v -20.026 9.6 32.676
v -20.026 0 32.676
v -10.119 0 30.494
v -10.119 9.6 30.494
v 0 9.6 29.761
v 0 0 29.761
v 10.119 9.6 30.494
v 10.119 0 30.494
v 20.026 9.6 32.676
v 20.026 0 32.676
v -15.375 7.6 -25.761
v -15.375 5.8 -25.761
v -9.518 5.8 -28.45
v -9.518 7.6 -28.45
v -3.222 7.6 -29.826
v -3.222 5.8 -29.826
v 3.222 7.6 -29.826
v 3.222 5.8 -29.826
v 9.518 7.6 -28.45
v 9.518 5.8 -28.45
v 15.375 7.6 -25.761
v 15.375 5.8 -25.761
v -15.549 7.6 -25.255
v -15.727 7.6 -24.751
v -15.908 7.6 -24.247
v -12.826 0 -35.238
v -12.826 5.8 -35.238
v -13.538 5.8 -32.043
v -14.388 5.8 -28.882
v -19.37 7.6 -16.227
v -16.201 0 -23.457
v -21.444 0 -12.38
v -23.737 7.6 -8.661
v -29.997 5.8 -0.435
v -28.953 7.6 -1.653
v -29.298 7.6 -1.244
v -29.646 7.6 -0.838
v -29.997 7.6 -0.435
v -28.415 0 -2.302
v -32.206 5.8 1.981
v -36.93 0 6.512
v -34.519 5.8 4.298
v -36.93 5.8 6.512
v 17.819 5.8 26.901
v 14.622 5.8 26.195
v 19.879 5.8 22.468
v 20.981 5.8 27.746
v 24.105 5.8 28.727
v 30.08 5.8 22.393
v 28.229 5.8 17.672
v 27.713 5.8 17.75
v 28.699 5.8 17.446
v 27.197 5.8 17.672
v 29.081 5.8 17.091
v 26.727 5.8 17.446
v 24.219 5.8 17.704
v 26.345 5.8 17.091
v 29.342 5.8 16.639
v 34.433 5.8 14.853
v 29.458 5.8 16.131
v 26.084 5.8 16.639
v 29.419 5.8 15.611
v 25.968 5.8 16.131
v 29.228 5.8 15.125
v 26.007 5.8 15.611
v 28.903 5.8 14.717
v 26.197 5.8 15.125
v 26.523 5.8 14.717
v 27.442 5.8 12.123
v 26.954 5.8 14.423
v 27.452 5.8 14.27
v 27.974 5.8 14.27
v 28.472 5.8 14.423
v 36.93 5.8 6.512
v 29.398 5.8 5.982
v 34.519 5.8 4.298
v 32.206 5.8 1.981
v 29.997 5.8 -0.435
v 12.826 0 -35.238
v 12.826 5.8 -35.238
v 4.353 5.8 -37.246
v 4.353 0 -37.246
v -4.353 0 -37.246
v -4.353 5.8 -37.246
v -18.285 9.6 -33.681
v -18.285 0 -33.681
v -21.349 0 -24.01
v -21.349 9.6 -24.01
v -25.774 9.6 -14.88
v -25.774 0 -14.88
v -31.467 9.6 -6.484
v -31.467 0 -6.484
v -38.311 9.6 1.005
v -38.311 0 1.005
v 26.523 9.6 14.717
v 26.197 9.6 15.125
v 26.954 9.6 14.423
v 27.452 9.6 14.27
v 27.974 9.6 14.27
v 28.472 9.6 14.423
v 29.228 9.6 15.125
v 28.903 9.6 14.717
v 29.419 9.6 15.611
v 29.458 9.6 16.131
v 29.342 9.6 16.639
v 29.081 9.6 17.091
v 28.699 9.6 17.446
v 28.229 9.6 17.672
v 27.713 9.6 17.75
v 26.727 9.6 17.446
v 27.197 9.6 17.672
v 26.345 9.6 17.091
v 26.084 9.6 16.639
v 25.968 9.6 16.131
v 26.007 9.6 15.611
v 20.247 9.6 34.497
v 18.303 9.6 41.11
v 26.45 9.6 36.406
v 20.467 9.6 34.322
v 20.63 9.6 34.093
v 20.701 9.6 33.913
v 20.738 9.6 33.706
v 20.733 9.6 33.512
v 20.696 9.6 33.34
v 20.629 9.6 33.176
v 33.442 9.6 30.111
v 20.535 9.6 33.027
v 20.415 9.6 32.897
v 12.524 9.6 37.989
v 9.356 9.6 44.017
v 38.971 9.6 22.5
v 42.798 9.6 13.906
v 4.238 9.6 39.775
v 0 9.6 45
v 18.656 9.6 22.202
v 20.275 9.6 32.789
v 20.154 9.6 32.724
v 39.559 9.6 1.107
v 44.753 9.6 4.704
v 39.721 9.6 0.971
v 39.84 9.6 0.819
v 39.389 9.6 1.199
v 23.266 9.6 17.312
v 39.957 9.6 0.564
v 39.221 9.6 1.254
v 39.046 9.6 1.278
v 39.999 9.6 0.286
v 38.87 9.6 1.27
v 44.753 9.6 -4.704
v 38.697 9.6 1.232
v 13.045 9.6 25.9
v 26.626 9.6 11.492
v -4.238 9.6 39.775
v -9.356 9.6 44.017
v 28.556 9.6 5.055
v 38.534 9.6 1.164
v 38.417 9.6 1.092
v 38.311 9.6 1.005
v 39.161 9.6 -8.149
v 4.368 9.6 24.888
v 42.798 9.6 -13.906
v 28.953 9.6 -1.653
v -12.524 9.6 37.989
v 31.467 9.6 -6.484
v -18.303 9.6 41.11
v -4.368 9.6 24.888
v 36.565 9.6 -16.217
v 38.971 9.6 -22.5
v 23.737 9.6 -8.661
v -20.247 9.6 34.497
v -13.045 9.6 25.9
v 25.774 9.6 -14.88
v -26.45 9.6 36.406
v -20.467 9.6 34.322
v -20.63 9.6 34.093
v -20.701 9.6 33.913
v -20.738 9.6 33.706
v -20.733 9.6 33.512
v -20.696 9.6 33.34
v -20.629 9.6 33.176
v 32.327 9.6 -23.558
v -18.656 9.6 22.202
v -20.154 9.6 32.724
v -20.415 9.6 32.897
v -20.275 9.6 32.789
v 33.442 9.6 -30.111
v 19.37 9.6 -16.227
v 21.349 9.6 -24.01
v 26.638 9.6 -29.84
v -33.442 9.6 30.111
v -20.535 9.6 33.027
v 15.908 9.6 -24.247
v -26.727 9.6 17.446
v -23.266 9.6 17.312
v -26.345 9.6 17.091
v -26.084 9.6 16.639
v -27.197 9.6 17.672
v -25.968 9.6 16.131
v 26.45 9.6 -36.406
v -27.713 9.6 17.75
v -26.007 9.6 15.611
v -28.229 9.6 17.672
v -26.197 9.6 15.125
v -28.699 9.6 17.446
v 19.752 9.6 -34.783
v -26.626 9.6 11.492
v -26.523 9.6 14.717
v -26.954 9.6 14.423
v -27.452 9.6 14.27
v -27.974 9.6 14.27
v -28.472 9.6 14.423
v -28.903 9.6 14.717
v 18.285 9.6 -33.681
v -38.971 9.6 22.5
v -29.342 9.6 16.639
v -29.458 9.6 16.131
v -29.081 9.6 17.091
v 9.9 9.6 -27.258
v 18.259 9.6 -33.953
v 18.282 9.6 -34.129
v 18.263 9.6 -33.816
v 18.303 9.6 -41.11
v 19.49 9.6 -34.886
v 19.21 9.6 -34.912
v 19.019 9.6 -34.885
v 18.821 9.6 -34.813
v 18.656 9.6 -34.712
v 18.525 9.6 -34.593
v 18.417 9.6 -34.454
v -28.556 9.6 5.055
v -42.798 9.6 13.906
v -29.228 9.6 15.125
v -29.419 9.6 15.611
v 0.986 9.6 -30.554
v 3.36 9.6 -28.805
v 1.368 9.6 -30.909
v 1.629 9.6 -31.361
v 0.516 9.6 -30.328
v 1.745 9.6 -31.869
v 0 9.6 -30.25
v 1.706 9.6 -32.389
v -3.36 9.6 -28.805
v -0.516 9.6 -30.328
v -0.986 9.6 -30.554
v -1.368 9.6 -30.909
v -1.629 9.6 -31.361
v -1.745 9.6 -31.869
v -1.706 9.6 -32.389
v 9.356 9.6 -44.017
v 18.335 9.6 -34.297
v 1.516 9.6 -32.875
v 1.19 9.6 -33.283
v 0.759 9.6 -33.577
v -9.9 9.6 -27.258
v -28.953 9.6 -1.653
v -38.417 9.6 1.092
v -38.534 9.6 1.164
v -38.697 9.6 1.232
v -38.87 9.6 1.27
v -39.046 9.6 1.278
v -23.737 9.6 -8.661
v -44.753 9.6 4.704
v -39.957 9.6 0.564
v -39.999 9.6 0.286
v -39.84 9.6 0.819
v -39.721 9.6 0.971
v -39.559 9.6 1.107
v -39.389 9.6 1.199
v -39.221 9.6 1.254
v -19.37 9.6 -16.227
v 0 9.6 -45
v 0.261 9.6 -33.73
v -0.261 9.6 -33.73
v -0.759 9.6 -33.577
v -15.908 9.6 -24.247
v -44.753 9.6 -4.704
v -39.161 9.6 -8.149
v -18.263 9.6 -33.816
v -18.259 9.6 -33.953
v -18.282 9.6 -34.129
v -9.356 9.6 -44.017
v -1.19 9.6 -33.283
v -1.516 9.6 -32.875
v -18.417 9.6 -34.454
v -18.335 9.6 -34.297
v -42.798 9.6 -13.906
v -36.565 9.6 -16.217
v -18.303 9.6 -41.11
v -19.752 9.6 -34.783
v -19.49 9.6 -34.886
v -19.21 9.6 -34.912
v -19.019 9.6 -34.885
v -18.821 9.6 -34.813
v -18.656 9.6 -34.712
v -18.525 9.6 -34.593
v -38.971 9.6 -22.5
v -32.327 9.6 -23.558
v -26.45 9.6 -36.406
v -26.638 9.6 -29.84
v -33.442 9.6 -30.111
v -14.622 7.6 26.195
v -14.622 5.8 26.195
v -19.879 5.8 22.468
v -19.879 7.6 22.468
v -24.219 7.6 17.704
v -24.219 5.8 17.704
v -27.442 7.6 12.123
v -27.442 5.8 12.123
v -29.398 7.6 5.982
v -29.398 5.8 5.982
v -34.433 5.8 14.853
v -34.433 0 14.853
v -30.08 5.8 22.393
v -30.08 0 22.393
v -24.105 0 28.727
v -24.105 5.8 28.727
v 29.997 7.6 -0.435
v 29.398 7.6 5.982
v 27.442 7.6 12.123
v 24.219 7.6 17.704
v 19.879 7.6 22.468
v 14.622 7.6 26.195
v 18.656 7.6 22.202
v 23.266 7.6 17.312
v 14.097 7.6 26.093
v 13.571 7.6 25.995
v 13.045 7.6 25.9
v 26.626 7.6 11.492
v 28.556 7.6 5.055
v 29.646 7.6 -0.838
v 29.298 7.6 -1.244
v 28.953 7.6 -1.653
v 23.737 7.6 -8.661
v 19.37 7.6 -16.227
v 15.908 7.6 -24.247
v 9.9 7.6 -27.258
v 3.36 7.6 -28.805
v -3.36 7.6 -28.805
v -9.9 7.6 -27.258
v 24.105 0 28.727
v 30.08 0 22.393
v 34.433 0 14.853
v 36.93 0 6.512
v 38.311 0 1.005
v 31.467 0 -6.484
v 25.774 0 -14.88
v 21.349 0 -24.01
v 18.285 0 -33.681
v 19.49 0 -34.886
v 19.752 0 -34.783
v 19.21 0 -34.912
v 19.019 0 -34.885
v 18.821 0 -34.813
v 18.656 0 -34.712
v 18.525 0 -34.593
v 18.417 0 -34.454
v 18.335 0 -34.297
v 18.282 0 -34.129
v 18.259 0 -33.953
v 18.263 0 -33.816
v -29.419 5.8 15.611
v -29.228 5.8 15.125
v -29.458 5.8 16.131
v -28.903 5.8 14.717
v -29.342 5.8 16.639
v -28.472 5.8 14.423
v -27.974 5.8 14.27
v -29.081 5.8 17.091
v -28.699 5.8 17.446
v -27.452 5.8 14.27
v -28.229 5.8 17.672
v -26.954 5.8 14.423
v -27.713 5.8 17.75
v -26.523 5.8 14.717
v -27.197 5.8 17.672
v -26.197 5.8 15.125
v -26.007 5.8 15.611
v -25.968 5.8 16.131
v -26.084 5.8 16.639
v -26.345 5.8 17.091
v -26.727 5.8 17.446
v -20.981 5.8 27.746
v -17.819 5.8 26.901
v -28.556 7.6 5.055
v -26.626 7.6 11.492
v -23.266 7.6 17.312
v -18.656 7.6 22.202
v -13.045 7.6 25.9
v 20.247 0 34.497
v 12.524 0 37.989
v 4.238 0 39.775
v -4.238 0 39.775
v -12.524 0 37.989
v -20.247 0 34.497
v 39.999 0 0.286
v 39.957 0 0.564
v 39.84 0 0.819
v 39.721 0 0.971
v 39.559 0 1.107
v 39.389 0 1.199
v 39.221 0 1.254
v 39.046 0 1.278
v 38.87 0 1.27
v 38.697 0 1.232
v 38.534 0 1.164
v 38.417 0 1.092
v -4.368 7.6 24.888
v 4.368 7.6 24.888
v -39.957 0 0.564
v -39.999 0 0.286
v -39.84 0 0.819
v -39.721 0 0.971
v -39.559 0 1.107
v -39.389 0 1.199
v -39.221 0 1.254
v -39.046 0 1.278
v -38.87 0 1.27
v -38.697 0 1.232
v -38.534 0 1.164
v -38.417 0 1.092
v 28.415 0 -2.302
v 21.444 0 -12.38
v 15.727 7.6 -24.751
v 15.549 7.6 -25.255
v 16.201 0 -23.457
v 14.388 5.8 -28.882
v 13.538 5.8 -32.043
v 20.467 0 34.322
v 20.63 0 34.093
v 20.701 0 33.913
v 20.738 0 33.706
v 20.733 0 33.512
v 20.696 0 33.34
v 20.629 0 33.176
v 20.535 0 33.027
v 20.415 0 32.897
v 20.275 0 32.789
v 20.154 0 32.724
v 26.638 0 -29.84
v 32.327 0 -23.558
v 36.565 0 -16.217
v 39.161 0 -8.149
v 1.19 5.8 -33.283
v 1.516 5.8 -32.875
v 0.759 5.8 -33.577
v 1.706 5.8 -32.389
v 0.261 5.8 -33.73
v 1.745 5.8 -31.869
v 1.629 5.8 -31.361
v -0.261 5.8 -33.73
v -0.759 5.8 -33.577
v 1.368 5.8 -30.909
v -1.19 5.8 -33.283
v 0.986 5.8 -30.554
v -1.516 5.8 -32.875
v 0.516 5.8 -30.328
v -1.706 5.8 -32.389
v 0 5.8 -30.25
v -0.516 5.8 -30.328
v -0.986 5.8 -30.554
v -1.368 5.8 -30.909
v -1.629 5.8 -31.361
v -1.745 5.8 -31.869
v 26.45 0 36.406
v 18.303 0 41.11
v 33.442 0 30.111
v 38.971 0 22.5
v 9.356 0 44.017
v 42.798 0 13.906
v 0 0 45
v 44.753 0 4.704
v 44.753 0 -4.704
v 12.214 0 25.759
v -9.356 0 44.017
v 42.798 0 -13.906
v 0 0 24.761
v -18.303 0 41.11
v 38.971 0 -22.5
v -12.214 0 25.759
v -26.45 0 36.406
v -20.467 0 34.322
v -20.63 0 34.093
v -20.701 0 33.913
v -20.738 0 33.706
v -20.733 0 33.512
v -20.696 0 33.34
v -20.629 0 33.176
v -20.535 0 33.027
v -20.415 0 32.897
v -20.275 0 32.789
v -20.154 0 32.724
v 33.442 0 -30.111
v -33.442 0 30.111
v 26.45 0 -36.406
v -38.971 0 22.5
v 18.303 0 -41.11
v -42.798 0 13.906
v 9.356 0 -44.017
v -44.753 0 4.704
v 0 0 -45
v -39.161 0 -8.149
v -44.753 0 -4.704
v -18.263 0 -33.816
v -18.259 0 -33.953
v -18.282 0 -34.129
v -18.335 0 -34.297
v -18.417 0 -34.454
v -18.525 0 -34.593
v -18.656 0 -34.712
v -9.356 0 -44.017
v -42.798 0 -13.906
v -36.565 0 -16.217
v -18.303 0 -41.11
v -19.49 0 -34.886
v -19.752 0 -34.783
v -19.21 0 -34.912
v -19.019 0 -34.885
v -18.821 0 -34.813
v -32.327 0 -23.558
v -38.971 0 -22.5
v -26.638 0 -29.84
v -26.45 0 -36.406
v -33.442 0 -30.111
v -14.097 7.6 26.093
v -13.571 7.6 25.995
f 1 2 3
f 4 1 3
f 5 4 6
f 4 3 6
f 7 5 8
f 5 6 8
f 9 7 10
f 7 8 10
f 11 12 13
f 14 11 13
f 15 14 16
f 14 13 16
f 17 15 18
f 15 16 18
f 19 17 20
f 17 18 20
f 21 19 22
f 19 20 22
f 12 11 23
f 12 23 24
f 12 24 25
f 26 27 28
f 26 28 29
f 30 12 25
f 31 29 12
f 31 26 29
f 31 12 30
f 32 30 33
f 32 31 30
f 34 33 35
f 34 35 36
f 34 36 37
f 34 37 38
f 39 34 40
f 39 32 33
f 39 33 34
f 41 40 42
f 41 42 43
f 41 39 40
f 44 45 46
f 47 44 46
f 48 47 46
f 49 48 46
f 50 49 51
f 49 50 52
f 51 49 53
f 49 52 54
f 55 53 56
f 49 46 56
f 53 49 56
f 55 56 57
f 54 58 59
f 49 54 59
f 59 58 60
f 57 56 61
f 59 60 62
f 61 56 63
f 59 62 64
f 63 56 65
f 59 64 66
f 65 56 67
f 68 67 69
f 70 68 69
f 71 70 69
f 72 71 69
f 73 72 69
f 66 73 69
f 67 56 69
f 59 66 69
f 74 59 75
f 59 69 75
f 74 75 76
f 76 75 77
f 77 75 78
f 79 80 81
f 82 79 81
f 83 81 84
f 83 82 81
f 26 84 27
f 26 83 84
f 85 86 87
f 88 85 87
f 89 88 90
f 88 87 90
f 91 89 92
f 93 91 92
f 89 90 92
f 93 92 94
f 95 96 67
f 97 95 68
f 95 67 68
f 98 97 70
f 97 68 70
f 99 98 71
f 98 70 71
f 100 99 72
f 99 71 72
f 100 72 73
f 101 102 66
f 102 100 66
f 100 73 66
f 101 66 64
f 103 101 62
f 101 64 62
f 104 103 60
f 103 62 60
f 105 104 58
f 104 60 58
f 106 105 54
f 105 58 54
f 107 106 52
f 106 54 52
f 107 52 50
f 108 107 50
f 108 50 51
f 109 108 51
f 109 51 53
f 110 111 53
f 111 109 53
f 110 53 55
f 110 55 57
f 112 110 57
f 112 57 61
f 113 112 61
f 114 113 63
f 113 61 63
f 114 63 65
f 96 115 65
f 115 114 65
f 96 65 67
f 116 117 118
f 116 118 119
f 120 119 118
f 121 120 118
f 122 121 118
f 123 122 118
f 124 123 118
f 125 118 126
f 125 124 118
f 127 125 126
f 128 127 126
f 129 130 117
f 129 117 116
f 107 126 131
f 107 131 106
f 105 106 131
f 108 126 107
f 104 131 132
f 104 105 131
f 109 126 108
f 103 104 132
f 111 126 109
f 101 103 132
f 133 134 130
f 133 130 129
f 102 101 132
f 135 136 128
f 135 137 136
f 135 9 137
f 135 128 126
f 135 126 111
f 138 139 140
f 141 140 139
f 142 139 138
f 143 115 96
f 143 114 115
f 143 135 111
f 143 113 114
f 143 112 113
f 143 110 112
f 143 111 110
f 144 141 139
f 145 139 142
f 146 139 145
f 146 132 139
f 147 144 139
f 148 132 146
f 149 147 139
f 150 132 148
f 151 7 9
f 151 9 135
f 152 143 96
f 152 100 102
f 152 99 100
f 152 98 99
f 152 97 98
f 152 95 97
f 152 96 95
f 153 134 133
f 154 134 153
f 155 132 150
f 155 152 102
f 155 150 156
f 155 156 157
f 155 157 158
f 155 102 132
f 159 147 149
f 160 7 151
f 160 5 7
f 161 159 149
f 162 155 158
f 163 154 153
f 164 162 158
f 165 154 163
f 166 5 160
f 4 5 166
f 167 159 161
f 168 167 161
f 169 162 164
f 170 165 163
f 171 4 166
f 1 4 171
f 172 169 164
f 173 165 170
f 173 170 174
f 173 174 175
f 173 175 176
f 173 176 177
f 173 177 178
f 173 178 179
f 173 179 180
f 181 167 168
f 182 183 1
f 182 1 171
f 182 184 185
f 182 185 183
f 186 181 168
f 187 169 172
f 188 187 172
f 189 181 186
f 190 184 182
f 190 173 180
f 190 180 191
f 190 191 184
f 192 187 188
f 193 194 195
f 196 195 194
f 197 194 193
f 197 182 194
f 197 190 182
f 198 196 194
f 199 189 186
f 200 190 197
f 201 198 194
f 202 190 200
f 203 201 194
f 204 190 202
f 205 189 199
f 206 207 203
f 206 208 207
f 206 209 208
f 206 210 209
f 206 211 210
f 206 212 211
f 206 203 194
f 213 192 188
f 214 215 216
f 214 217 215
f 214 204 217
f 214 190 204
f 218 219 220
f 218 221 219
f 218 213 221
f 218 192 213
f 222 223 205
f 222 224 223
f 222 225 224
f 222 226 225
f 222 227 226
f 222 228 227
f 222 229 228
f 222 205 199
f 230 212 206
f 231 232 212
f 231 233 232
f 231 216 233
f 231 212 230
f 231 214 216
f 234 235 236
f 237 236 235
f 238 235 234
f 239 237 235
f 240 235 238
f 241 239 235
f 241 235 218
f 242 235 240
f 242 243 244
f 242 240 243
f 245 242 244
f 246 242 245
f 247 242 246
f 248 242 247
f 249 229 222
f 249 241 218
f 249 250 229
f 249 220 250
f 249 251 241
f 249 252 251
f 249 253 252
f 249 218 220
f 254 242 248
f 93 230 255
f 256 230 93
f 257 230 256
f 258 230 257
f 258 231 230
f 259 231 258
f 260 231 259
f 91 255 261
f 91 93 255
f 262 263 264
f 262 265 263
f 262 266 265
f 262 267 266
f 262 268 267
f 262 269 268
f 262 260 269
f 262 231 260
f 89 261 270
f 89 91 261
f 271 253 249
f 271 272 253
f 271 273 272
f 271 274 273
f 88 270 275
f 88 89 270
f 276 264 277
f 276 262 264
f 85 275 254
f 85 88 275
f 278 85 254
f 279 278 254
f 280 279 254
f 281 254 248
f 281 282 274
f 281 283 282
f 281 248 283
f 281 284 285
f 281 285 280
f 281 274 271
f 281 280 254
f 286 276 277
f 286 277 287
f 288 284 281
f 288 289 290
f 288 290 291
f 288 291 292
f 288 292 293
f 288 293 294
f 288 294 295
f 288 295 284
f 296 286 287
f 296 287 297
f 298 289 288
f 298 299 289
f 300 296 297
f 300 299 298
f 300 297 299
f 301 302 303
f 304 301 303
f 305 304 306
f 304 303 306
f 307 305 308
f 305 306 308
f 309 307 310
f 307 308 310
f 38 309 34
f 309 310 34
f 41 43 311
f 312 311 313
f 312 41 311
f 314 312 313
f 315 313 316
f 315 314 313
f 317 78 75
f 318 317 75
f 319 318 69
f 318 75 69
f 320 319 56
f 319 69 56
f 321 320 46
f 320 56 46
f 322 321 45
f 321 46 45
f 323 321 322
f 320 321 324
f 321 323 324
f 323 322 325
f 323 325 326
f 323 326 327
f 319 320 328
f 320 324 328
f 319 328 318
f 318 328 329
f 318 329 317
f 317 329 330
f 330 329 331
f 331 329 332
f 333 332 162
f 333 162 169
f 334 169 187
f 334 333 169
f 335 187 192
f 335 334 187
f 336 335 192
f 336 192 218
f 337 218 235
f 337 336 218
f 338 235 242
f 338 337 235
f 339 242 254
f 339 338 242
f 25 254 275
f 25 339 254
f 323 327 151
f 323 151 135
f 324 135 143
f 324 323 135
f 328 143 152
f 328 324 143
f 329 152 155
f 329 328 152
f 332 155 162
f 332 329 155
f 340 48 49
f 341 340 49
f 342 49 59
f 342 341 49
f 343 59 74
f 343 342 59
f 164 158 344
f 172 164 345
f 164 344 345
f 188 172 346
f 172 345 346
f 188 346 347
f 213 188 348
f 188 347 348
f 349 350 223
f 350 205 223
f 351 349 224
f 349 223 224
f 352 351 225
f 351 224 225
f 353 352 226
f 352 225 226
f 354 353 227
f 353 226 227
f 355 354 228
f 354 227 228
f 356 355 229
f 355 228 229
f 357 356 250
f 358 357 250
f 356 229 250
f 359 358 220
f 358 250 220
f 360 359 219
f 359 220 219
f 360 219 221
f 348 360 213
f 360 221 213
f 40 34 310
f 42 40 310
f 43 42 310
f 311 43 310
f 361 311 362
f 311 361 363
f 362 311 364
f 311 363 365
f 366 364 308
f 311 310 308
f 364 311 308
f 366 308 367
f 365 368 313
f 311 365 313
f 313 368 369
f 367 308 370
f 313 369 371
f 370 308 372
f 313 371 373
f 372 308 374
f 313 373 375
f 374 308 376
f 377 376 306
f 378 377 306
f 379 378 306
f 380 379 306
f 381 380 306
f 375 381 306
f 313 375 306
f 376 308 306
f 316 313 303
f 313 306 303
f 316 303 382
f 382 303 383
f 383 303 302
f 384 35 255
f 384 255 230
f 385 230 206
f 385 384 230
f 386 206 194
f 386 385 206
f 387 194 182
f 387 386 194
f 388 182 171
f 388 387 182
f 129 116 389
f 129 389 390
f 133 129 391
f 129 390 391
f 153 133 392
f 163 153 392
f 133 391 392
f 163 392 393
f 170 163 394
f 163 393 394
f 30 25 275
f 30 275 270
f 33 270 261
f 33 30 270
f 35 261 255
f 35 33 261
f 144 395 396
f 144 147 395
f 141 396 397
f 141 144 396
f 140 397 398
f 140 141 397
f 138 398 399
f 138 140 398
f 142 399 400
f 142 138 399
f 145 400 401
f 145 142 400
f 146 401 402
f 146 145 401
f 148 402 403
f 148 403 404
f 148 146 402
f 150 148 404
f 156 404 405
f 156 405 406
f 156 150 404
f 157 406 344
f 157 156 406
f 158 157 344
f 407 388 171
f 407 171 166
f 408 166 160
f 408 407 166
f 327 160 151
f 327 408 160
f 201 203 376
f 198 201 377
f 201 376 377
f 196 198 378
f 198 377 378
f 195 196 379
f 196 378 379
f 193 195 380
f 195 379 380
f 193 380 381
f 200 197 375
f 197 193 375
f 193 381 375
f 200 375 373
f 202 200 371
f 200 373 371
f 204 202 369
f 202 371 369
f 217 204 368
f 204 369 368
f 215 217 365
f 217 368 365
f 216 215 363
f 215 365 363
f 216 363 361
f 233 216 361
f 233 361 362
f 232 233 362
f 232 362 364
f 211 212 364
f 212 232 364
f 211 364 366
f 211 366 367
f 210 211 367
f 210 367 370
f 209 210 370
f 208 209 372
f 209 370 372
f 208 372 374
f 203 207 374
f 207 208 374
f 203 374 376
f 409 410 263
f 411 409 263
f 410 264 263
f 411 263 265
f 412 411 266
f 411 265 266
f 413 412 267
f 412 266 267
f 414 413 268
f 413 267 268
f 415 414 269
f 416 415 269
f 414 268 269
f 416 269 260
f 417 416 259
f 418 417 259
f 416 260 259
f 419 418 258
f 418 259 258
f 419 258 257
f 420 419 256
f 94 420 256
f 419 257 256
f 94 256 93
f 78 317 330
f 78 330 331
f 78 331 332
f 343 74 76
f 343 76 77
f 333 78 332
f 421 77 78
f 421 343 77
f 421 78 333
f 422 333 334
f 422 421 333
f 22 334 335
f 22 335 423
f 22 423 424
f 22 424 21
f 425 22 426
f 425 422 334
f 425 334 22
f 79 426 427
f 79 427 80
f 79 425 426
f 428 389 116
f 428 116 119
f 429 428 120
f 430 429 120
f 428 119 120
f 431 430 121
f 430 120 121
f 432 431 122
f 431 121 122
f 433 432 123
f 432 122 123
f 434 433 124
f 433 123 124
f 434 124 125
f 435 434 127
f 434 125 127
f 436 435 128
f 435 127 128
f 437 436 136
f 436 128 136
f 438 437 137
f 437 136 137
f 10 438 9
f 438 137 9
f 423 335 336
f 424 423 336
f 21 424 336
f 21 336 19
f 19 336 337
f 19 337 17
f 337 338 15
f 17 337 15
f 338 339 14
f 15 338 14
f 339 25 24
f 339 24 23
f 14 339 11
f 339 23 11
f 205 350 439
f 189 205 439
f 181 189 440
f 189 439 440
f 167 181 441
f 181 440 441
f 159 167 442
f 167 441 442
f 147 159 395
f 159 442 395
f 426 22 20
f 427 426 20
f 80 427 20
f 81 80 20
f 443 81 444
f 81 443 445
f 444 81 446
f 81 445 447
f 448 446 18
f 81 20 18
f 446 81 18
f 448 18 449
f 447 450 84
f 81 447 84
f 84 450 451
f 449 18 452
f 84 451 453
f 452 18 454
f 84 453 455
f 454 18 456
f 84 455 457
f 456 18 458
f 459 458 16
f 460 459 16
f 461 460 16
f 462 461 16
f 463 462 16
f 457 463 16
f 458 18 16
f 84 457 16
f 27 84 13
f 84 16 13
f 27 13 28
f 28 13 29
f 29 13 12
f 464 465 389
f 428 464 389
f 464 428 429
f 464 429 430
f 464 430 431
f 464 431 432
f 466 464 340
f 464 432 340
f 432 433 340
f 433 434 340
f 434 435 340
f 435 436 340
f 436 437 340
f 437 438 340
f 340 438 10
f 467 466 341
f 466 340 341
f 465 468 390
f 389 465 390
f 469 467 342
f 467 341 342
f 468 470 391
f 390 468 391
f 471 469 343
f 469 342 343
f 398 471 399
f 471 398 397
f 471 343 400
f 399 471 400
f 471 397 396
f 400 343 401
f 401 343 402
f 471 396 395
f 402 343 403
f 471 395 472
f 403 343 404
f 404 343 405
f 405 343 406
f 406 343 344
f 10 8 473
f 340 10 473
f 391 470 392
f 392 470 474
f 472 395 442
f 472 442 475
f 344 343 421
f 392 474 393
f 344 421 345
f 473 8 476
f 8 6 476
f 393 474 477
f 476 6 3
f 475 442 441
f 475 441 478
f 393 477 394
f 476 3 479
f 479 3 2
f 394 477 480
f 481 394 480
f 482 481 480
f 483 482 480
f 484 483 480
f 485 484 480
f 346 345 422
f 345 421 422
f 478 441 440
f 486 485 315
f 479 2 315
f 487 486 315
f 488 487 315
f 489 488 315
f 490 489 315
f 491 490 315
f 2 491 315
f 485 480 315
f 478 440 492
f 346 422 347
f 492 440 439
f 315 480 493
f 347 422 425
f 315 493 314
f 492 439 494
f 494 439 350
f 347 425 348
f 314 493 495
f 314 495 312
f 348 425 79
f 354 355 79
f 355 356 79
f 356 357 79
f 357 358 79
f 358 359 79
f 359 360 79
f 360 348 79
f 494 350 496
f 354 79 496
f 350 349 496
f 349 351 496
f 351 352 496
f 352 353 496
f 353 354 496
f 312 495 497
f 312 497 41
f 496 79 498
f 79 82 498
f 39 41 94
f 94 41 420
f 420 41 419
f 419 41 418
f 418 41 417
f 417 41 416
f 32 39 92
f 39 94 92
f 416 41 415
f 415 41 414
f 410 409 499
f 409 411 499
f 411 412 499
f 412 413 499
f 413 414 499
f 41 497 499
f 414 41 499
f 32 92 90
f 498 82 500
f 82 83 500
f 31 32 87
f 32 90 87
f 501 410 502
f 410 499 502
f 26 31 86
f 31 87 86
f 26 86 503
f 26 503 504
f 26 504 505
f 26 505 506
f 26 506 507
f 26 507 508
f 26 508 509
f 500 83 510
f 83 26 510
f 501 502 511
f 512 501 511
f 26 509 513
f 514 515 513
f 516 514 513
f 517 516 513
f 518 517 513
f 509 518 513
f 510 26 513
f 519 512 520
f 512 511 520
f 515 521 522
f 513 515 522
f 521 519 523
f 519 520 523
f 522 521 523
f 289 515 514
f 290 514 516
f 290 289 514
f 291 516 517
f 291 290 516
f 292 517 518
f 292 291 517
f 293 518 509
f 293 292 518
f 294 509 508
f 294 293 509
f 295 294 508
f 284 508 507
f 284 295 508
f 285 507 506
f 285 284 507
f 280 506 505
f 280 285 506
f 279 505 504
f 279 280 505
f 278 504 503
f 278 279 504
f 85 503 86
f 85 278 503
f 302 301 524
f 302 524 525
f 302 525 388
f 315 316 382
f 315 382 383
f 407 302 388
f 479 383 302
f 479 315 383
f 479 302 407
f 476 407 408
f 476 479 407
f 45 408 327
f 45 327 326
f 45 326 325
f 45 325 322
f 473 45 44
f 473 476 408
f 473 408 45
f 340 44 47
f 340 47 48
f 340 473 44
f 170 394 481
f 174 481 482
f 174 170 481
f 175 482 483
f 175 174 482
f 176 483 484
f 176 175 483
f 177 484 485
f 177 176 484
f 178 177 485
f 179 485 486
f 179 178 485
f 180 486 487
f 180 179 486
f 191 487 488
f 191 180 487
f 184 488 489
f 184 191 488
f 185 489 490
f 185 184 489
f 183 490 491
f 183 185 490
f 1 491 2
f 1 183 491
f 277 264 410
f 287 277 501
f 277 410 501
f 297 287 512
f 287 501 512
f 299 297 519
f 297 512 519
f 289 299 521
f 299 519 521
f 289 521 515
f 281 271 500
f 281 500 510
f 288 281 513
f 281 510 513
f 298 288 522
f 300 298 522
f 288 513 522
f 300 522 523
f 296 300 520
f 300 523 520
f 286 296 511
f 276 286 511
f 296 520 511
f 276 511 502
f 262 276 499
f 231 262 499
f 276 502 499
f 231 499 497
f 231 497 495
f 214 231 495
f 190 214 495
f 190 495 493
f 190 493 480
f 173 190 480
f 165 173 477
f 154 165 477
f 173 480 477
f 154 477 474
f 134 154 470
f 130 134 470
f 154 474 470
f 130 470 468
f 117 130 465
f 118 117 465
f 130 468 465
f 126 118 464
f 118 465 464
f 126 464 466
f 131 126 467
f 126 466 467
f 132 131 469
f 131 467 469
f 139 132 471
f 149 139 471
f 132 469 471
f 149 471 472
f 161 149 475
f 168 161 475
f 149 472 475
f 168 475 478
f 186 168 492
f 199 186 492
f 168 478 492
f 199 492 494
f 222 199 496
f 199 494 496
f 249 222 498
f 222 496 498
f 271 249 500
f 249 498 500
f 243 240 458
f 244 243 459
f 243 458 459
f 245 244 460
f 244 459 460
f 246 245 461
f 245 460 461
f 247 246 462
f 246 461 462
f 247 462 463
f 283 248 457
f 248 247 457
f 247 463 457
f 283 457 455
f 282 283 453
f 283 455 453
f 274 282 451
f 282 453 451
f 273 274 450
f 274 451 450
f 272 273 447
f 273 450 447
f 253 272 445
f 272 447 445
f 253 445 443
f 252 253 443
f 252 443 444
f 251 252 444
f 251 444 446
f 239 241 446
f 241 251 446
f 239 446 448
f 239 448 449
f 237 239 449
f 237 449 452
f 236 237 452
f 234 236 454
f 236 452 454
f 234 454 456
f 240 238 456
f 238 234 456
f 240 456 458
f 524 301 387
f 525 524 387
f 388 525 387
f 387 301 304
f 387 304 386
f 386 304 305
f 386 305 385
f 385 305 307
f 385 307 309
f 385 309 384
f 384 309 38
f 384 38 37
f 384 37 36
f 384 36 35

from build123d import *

# Parameters (mm, degrees)
SKETCH1_R                = 37.5
BOSS_EXTRUDE1_DEPTH      = 7.6
CUT_EXTRUDE2_START       = -7.6
CUT_EXTRUDE2_DEPTH       = 7.6
SKETCH4_R                = 45
SKETCH4_R_2              = 37.5
BOSS_EXTRUDE2_DEPTH      = 7.6
SKETCH6_R                = 45
BOSS_EXTRUDE3_DEPTH      = 2
SKETCH7_R                = 1.75
CUT_EXTRUDE3_DEPTH       = 65.359614666
CIRPATTERN2_COUNT        = 3
CUT_EXTRUDE7_DEPTH       = 65.359614666
FILLET3_R                = 1
CIRPATTERN3_COUNT        = 3
FILLET3_OF_CIRPATTERN3_R = 1
BOSS_EXTRUDE4_START      = 1.8
SKETCH15_R               = 1.75
BOSS_EXTRUDE4_DEPTH      = 1.8
CIRPATTERN4_COUNT        = 3


# Read off the part's stored shape, not the designer's step: Cut-Extrude2
with BuildPart() as part:
    # Sketch1 → Boss-Extrude1 (new body)
    with BuildSketch(Plane(origin=(0, 0, 0), x_dir=(1, 0, 0), z_dir=(0, 1, 0))):
        with Locations(Location((0, 0, 0), (0, 0, 90))):
            Circle(SKETCH1_R)
    extrude(amount=BOSS_EXTRUDE1_DEPTH)

    # Cut-Extrude2 outline → Cut-Extrude2 (cut)
    with BuildSketch(Plane(origin=(0, 7.6, 0), x_dir=(1, 0, 0), z_dir=(0, 1, 0)).offset(CUT_EXTRUDE2_START)):
        with BuildLine():
            ThreePointArc((-24.104535363, -28.726666617), (0, -24.760936498), (24.104535363, -28.726666617))
            ThreePointArc((24.104535363, -28.726666617), (32.475952642, -18.75), (36.930290738, -6.511806663))
            ThreePointArc((36.930290738, -6.511806663), (21.443600029, 12.380468249), (12.825755375, 35.238473279))
            ThreePointArc((12.825755375, 35.238473279), (0, 37.5), (-12.825755375, 35.238473279))
            ThreePointArc((-12.825755375, 35.238473279), (-21.443600029, 12.380468249), (-36.930290738, -6.511806663))
            ThreePointArc((-36.930290738, -6.511806663), (-32.475952642, -18.75), (-24.104535363, -28.726666617))
        make_face()
    extrude(amount=CUT_EXTRUDE2_DEPTH, mode=Mode.SUBTRACT)

    # Sketch4 → Boss-Extrude2 (add)
    with BuildSketch(Plane(origin=(0, 0, 0), x_dir=(1, 0, 0), z_dir=(0, 1, 0))):
        with Locations(Location((0, 0, 0), (0, 0, 90))):
            Circle(SKETCH4_R)
        Circle(SKETCH4_R_2, mode=Mode.SUBTRACT)
    extrude(amount=BOSS_EXTRUDE2_DEPTH)

    # Sketch6 → Boss-Extrude3 (add)
    with BuildSketch(Plane(origin=(0, 7.6, 0), x_dir=(1, 0, 0), z_dir=(0, 1, 0))):
        with Locations(Location((0, 0, 0), (0, 0, 90))):
            Circle(SKETCH6_R)
        with BuildLine():
            ThreePointArc((-28.952849653, 1.653026611), (-25.11473671, -14.5), (-13.044861788, -25.900416617))
            ThreePointArc((-13.044861788, -25.900416617), (0, -24.760936498), (13.044861788, -25.900416617))
            ThreePointArc((13.044861788, -25.900416617), (25.11473671, -14.5), (28.952849653, 1.653026611))
            ThreePointArc((28.952849653, 1.653026611), (21.443600029, 12.380468249), (15.907987865, 24.247390006))
            ThreePointArc((15.907987865, 24.247390006), (0, 29), (-15.907987865, 24.247390006))
            ThreePointArc((-15.907987865, 24.247390006), (-21.443600029, 12.380468249), (-28.952849653, 1.653026611))
        make_face(mode=Mode.SUBTRACT)
    extrude(amount=BOSS_EXTRUDE3_DEPTH)

    # Sketch7 → Cut-Extrude3 (cut, through all)
    with BuildSketch(Plane(origin=(0, 9.6, 0), x_dir=(1, 0, 0), z_dir=(0, 1, 0))):
        with Locations(Location((0, 32, 0), (0, 0, 270))):
            Circle(SKETCH7_R)
    cut_extrude3 = extrude(amount=-CUT_EXTRUDE3_DEPTH, mode=Mode.SUBTRACT)

    # CirPattern2: Cut-Extrude3 ×3 about axis
    cirpattern2_axis = Axis((0, 0, 0), (0, 1, 0))
    for i in range(1, CIRPATTERN2_COUNT):
        add(cut_extrude3.rotate(cirpattern2_axis, i * 360 / CIRPATTERN2_COUNT), mode=Mode.SUBTRACT)

    # Sketch13 → Cut-Extrude7 (cut, through all)
    with BuildSketch(Plane.XZ):
        with BuildLine():
            ThreePointArc((-22.11228446, 33.332369792), (0, 29.760936498), (22.11228446, 33.332369792))
            ThreePointArc((22.11228446, 33.332369792), (0, 40), (-22.11228446, 33.332369792))
        make_face()
    cut_extrude7 = extrude(amount=-CUT_EXTRUDE7_DEPTH, mode=Mode.SUBTRACT)

    # Fillet3
    fillet3_edges = [part.edges().sort_by_distance(p)[0] for p in [
        (-22.11228446, 4.8, 33.332369792),
        (22.11228446, 4.8, 33.332369792),
    ]]
    fillet(fillet3_edges, radius=FILLET3_R)

    # CirPattern3: Cut-Extrude7 ×3 about axis
    cirpattern3_axis = Axis((0, 0, 0), (0, 1, 0))
    for i in range(1, CIRPATTERN3_COUNT):
        add(cut_extrude7.rotate(cirpattern3_axis, i * 360 / CIRPATTERN3_COUNT), mode=Mode.SUBTRACT)

    # Fillet3 of CirPattern3
    fillet3_of_cirpattern3_edges = [part.edges().sort_by_distance(p)[0] for p in [
        (39.922821238, 4.8, 2.483615182),
        (17.810536778, 4.8, -35.815984974),
        (-17.810536778, 4.8, -35.815984974),
        (-39.922821238, 4.8, 2.483615182),
    ]]
    fillet(fillet3_of_cirpattern3_edges, radius=FILLET3_OF_CIRPATTERN3_R)

    # Sketch15 → Boss-Extrude4 (add)
    with BuildSketch(Plane.XZ.offset(-7.6).offset(BOSS_EXTRUDE4_START)):
        with BuildLine():
            ThreePointArc((-15.374943027, -25.760650747), (0, -30), (15.374943027, -25.760650747))
            ThreePointArc((15.374943027, -25.760650747), (13.94564115, -30.457951205), (12.825755375, -35.238473279))
            ThreePointArc((12.825755375, -35.238473279), (0, -37.5), (-12.825755375, -35.238473279))
            ThreePointArc((-12.825755375, -35.238473279), (-13.94564115, -30.457951205), (-15.374943027, -25.760650747))
        make_face()
        with Locations(Location((0, -32, 0), (0, 0, 90))):
            Circle(SKETCH15_R, mode=Mode.SUBTRACT)
    boss_extrude4 = extrude(amount=-BOSS_EXTRUDE4_DEPTH)

    # CirPattern4: Boss-Extrude4 ×3 about axis
    cirpattern4_axis = Axis((0, 7.6, 0), (0, -1, 0))
    for i in range(1, CIRPATTERN4_COUNT):
        add(boss_extrude4.rotate(cirpattern4_axis, i * 360 / CIRPATTERN4_COUNT))


solid = part.part
